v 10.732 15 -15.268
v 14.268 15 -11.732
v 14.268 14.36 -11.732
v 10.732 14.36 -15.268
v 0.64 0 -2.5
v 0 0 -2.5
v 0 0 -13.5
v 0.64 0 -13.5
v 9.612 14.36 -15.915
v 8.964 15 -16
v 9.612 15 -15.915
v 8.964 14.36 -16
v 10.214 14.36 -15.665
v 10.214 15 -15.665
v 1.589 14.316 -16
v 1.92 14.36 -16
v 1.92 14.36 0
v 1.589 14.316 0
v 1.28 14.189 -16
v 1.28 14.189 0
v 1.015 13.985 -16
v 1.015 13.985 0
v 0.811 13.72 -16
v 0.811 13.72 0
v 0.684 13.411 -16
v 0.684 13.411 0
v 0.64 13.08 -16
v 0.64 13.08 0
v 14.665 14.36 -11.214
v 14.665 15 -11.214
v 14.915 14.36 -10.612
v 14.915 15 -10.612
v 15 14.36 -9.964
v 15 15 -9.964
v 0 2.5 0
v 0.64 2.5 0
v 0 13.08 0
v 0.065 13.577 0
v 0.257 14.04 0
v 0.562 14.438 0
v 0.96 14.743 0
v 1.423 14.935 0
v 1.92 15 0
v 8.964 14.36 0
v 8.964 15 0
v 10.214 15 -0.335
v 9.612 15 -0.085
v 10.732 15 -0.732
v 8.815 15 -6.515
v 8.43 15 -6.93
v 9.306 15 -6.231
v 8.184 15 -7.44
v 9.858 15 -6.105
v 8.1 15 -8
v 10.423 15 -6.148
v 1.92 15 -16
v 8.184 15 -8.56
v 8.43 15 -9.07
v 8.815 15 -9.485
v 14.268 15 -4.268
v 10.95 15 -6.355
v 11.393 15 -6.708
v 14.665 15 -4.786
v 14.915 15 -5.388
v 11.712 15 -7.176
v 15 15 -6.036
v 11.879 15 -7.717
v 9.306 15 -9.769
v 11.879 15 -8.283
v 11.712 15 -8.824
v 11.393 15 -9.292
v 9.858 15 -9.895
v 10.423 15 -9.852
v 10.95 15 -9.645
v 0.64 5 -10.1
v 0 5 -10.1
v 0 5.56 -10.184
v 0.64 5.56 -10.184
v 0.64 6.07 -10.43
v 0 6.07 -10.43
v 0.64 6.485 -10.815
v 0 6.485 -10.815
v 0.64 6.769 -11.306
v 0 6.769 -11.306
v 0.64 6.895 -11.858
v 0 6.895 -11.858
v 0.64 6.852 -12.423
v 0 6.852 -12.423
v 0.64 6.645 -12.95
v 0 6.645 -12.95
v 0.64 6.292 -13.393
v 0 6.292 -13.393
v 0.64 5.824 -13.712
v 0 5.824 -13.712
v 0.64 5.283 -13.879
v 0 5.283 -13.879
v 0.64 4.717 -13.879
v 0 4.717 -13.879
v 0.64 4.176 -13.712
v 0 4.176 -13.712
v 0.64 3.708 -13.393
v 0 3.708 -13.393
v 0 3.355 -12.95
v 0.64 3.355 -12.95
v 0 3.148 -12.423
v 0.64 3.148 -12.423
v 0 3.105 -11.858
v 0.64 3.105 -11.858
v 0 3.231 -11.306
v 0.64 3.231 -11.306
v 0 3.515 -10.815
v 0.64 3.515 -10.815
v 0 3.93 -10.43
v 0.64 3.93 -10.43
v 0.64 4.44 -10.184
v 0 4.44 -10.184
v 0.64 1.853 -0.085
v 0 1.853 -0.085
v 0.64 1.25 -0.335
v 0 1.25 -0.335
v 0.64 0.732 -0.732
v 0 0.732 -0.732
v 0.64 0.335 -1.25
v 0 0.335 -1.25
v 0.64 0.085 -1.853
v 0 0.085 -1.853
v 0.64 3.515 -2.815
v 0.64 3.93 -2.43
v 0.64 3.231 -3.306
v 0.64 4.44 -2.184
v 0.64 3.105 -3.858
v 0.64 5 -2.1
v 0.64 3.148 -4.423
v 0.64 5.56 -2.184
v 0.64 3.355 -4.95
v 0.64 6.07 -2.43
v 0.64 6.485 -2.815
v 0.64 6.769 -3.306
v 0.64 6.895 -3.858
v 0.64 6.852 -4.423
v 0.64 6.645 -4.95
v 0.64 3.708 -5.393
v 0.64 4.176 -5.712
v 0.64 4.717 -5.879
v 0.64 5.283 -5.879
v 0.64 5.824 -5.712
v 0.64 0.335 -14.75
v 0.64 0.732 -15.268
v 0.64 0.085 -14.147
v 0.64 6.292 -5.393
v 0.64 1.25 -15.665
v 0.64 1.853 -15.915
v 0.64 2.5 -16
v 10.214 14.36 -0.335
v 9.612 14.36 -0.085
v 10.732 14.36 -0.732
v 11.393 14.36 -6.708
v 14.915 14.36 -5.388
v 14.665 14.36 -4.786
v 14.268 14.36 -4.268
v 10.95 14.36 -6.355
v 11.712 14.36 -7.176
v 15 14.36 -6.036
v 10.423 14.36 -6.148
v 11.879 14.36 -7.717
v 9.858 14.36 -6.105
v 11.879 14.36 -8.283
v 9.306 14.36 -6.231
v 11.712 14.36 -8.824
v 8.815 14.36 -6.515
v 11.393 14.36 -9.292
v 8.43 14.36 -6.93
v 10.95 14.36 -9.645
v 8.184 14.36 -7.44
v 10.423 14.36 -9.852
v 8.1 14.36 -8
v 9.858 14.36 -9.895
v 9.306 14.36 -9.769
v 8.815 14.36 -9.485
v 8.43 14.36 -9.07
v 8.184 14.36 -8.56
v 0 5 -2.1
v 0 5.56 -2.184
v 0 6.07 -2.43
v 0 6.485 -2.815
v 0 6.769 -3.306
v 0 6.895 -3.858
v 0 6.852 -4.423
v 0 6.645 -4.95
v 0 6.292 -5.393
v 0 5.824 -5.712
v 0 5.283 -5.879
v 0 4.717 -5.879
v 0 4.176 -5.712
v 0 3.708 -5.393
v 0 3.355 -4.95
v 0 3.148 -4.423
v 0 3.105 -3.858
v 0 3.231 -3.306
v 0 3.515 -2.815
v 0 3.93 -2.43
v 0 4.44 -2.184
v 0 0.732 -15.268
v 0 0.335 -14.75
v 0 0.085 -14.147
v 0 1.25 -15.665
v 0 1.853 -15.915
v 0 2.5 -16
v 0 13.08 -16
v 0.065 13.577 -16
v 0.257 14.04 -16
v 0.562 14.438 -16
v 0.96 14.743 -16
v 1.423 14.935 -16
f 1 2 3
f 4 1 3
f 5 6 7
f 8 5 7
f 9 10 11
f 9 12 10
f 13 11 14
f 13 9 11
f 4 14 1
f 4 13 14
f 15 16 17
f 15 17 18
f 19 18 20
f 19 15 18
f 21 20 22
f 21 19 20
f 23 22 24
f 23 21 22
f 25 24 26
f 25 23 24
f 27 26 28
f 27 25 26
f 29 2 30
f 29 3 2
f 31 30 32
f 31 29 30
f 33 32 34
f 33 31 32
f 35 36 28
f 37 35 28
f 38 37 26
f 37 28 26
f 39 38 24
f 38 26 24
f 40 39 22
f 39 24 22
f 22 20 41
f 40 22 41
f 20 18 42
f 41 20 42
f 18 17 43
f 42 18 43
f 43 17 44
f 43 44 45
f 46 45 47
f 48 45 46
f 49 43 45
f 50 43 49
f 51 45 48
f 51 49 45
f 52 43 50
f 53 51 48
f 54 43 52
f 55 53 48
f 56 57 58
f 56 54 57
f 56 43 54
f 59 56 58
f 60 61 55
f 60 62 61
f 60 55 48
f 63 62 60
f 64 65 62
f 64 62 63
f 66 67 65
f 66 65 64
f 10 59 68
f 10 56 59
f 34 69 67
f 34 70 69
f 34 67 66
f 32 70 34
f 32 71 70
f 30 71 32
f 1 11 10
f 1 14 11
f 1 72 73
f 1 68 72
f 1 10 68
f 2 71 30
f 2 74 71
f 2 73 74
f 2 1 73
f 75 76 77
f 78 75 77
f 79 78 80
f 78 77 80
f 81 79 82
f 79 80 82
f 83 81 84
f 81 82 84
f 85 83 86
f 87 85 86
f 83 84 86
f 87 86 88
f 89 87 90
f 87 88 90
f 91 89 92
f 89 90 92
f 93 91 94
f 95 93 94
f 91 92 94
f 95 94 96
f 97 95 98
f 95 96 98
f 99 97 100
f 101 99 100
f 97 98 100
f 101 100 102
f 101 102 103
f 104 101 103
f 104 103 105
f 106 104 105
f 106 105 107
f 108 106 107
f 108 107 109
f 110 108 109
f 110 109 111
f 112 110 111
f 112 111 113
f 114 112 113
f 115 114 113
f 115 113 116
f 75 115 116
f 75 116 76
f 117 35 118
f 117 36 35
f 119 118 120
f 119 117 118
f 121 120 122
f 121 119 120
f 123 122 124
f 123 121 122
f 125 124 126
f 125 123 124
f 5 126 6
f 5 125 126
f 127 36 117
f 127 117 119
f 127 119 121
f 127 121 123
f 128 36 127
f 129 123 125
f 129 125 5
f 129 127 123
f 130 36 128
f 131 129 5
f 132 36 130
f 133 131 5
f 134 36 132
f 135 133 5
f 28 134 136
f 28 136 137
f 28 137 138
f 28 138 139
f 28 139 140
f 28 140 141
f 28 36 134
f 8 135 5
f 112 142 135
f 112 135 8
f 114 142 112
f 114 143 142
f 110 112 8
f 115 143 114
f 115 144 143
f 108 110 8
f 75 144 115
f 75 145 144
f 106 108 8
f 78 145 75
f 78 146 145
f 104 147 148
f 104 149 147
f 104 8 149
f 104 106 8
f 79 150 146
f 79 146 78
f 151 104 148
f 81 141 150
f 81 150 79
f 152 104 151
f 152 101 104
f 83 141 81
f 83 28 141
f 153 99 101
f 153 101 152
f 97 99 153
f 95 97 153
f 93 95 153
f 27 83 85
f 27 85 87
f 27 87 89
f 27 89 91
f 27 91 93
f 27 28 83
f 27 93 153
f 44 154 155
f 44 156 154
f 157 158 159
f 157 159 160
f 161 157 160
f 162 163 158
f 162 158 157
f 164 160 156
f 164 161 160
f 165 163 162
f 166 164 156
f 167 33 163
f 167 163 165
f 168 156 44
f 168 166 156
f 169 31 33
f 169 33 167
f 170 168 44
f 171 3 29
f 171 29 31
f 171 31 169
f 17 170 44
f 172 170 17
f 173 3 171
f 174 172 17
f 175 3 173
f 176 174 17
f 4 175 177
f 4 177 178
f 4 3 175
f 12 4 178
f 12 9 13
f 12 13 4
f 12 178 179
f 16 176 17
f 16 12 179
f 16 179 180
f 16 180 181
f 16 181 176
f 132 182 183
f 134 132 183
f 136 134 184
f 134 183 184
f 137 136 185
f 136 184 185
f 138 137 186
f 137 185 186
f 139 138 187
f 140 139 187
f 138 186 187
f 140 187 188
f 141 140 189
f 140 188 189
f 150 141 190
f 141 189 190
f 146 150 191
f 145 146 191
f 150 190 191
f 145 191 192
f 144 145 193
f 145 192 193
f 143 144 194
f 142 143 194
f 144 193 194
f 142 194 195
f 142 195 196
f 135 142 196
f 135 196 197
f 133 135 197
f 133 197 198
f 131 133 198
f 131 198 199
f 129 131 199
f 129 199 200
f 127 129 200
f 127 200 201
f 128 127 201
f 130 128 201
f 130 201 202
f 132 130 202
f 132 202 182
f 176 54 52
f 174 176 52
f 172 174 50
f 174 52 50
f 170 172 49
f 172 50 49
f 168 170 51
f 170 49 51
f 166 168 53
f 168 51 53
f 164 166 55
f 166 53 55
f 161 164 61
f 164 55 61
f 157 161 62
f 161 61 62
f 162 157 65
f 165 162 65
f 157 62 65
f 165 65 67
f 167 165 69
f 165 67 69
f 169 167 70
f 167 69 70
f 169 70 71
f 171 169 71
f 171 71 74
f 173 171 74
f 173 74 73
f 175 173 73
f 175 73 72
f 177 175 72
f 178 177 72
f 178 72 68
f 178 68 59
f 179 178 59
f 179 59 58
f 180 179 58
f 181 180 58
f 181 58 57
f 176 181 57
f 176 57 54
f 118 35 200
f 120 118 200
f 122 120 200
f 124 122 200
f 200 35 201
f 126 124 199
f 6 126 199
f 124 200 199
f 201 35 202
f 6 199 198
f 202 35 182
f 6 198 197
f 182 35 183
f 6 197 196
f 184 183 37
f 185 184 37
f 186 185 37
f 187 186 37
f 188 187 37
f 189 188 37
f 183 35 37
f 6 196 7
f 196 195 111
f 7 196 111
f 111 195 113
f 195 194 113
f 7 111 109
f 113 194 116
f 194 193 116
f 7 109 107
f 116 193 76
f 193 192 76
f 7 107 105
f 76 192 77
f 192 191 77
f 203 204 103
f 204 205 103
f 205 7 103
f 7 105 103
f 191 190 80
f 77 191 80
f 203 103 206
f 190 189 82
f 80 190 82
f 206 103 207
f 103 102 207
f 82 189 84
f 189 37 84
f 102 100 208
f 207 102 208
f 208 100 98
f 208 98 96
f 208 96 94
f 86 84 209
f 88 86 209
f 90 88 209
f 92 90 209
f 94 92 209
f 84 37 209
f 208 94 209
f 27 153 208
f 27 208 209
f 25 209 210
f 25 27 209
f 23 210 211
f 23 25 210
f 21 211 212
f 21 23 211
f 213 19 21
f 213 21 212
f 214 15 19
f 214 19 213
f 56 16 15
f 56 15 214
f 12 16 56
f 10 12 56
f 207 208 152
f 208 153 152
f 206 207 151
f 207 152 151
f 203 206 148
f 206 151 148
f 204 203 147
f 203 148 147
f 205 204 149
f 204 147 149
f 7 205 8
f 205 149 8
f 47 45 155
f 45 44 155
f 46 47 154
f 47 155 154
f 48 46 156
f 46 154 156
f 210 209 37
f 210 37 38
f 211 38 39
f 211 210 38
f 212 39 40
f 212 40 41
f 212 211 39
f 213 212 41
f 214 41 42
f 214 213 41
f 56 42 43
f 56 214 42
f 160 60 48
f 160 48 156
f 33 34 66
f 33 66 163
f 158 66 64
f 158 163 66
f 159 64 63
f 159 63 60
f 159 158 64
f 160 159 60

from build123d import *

# Parameters (mm, degrees)
SKETCH1_W                    = 16
SKETCH1_H                    = 15
BOSS_EXTRUDE1_DEPTH          = 0.64
EDGE_FLANGE1_STRIP_W         = 5.12
EDGE_FLANGE1_STRIP_H         = 0.64
EDGE_FLANGE1_STRIP_CUT_DEPTH = 16
EDGE_FLANGE1_DEPTH           = 16
SKETCH9_R                    = 1.9
CUT_EXTRUDE1_DEPTH           = 27.570660511
SKETCH10_R                   = 1.9
CUT_EXTRUDE2_DEPTH           = 27.570660511
CHAMFER1_SIZE                = 5
FILLET1_R                    = 2.5


# Sheet-metal steps are written as plain solids
with BuildPart() as part:
    # Sketch1 → Boss-Extrude1 (new body)
    with BuildSketch(Plane(origin=(0, 0, 0), x_dir=(0, 0, -1), z_dir=(1, 0, 0))):
        with Locations((8, 7.5)):
            Rectangle(SKETCH1_W, SKETCH1_H)
    extrude(amount=BOSS_EXTRUDE1_DEPTH)

    # Edge-Flange1 strip (across the edge) → Edge-Flange1 strip cut (cut)
    with BuildSketch(Plane(origin=(0.64, 15, -16), x_dir=(0, -1, 0), z_dir=(0, 0, 1))):
        with Locations((-0.64, -0.32)):
            Rectangle(EDGE_FLANGE1_STRIP_W, EDGE_FLANGE1_STRIP_H)
    extrude(amount=EDGE_FLANGE1_STRIP_CUT_DEPTH, mode=Mode.SUBTRACT)

    # Edge-Flange1 section (across the edge) → Edge-Flange1 (add)
    with BuildSketch(Plane(origin=(0.64, 15, -16), x_dir=(0, -1, 0), z_dir=(0, 0, 1))):
        with BuildLine():
            Line((0, 1.28), (0, 14.36))
            Line((0, 14.36), (0.64, 14.36))
            Line((0.64, 14.36), (0.64, 1.28))
            ThreePointArc((0.64, 1.28), (1.01490332, 0.37490332), (1.92, 0))
            Line((1.92, 0), (1.92, -0.64))
            ThreePointArc((1.92, -0.64), (0.56235498, -0.07764502), (0, 1.28))
        make_face()
    extrude(amount=EDGE_FLANGE1_DEPTH)

    # Sketch9 → Cut-Extrude1 (cut, through all)
    with BuildSketch(Plane.ZY):
        with Locations((-12, 5)):
            Circle(SKETCH9_R)
        with Locations((-4, 5)):
            Circle(SKETCH9_R)
    extrude(amount=-CUT_EXTRUDE1_DEPTH, mode=Mode.SUBTRACT)

    # Sketch10 → Cut-Extrude2 (cut, through all)
    with BuildSketch(Plane(origin=(0, 15, 0), x_dir=(1, 0, 0), z_dir=(0, 1, 0))):
        with Locations(Location((10, 8, 0), (0, 0, 180))):
            Circle(SKETCH10_R)
    extrude(amount=-CUT_EXTRUDE2_DEPTH, mode=Mode.SUBTRACT)

    # Chamfer1
    chamfer1_edges = [part.edges().sort_by_distance(p)[0] for p in [
        (15, 14.68, -16),
        (15, 14.68, 0),
    ]]
    chamfer(chamfer1_edges, length=CHAMFER1_SIZE)

    # Fillet1
    fillet1_edges = [part.edges().sort_by_distance(p)[0] for p in [
        (10, 14.68, -16),
        (15, 14.68, -5),
        (15, 14.68, -11),
        (10, 14.68, 0),
        (0.32, 0, 0),
        (0.32, 0, -16),
    ]]
    fillet(fillet1_edges, radius=FILLET1_R)


solid = part.part
